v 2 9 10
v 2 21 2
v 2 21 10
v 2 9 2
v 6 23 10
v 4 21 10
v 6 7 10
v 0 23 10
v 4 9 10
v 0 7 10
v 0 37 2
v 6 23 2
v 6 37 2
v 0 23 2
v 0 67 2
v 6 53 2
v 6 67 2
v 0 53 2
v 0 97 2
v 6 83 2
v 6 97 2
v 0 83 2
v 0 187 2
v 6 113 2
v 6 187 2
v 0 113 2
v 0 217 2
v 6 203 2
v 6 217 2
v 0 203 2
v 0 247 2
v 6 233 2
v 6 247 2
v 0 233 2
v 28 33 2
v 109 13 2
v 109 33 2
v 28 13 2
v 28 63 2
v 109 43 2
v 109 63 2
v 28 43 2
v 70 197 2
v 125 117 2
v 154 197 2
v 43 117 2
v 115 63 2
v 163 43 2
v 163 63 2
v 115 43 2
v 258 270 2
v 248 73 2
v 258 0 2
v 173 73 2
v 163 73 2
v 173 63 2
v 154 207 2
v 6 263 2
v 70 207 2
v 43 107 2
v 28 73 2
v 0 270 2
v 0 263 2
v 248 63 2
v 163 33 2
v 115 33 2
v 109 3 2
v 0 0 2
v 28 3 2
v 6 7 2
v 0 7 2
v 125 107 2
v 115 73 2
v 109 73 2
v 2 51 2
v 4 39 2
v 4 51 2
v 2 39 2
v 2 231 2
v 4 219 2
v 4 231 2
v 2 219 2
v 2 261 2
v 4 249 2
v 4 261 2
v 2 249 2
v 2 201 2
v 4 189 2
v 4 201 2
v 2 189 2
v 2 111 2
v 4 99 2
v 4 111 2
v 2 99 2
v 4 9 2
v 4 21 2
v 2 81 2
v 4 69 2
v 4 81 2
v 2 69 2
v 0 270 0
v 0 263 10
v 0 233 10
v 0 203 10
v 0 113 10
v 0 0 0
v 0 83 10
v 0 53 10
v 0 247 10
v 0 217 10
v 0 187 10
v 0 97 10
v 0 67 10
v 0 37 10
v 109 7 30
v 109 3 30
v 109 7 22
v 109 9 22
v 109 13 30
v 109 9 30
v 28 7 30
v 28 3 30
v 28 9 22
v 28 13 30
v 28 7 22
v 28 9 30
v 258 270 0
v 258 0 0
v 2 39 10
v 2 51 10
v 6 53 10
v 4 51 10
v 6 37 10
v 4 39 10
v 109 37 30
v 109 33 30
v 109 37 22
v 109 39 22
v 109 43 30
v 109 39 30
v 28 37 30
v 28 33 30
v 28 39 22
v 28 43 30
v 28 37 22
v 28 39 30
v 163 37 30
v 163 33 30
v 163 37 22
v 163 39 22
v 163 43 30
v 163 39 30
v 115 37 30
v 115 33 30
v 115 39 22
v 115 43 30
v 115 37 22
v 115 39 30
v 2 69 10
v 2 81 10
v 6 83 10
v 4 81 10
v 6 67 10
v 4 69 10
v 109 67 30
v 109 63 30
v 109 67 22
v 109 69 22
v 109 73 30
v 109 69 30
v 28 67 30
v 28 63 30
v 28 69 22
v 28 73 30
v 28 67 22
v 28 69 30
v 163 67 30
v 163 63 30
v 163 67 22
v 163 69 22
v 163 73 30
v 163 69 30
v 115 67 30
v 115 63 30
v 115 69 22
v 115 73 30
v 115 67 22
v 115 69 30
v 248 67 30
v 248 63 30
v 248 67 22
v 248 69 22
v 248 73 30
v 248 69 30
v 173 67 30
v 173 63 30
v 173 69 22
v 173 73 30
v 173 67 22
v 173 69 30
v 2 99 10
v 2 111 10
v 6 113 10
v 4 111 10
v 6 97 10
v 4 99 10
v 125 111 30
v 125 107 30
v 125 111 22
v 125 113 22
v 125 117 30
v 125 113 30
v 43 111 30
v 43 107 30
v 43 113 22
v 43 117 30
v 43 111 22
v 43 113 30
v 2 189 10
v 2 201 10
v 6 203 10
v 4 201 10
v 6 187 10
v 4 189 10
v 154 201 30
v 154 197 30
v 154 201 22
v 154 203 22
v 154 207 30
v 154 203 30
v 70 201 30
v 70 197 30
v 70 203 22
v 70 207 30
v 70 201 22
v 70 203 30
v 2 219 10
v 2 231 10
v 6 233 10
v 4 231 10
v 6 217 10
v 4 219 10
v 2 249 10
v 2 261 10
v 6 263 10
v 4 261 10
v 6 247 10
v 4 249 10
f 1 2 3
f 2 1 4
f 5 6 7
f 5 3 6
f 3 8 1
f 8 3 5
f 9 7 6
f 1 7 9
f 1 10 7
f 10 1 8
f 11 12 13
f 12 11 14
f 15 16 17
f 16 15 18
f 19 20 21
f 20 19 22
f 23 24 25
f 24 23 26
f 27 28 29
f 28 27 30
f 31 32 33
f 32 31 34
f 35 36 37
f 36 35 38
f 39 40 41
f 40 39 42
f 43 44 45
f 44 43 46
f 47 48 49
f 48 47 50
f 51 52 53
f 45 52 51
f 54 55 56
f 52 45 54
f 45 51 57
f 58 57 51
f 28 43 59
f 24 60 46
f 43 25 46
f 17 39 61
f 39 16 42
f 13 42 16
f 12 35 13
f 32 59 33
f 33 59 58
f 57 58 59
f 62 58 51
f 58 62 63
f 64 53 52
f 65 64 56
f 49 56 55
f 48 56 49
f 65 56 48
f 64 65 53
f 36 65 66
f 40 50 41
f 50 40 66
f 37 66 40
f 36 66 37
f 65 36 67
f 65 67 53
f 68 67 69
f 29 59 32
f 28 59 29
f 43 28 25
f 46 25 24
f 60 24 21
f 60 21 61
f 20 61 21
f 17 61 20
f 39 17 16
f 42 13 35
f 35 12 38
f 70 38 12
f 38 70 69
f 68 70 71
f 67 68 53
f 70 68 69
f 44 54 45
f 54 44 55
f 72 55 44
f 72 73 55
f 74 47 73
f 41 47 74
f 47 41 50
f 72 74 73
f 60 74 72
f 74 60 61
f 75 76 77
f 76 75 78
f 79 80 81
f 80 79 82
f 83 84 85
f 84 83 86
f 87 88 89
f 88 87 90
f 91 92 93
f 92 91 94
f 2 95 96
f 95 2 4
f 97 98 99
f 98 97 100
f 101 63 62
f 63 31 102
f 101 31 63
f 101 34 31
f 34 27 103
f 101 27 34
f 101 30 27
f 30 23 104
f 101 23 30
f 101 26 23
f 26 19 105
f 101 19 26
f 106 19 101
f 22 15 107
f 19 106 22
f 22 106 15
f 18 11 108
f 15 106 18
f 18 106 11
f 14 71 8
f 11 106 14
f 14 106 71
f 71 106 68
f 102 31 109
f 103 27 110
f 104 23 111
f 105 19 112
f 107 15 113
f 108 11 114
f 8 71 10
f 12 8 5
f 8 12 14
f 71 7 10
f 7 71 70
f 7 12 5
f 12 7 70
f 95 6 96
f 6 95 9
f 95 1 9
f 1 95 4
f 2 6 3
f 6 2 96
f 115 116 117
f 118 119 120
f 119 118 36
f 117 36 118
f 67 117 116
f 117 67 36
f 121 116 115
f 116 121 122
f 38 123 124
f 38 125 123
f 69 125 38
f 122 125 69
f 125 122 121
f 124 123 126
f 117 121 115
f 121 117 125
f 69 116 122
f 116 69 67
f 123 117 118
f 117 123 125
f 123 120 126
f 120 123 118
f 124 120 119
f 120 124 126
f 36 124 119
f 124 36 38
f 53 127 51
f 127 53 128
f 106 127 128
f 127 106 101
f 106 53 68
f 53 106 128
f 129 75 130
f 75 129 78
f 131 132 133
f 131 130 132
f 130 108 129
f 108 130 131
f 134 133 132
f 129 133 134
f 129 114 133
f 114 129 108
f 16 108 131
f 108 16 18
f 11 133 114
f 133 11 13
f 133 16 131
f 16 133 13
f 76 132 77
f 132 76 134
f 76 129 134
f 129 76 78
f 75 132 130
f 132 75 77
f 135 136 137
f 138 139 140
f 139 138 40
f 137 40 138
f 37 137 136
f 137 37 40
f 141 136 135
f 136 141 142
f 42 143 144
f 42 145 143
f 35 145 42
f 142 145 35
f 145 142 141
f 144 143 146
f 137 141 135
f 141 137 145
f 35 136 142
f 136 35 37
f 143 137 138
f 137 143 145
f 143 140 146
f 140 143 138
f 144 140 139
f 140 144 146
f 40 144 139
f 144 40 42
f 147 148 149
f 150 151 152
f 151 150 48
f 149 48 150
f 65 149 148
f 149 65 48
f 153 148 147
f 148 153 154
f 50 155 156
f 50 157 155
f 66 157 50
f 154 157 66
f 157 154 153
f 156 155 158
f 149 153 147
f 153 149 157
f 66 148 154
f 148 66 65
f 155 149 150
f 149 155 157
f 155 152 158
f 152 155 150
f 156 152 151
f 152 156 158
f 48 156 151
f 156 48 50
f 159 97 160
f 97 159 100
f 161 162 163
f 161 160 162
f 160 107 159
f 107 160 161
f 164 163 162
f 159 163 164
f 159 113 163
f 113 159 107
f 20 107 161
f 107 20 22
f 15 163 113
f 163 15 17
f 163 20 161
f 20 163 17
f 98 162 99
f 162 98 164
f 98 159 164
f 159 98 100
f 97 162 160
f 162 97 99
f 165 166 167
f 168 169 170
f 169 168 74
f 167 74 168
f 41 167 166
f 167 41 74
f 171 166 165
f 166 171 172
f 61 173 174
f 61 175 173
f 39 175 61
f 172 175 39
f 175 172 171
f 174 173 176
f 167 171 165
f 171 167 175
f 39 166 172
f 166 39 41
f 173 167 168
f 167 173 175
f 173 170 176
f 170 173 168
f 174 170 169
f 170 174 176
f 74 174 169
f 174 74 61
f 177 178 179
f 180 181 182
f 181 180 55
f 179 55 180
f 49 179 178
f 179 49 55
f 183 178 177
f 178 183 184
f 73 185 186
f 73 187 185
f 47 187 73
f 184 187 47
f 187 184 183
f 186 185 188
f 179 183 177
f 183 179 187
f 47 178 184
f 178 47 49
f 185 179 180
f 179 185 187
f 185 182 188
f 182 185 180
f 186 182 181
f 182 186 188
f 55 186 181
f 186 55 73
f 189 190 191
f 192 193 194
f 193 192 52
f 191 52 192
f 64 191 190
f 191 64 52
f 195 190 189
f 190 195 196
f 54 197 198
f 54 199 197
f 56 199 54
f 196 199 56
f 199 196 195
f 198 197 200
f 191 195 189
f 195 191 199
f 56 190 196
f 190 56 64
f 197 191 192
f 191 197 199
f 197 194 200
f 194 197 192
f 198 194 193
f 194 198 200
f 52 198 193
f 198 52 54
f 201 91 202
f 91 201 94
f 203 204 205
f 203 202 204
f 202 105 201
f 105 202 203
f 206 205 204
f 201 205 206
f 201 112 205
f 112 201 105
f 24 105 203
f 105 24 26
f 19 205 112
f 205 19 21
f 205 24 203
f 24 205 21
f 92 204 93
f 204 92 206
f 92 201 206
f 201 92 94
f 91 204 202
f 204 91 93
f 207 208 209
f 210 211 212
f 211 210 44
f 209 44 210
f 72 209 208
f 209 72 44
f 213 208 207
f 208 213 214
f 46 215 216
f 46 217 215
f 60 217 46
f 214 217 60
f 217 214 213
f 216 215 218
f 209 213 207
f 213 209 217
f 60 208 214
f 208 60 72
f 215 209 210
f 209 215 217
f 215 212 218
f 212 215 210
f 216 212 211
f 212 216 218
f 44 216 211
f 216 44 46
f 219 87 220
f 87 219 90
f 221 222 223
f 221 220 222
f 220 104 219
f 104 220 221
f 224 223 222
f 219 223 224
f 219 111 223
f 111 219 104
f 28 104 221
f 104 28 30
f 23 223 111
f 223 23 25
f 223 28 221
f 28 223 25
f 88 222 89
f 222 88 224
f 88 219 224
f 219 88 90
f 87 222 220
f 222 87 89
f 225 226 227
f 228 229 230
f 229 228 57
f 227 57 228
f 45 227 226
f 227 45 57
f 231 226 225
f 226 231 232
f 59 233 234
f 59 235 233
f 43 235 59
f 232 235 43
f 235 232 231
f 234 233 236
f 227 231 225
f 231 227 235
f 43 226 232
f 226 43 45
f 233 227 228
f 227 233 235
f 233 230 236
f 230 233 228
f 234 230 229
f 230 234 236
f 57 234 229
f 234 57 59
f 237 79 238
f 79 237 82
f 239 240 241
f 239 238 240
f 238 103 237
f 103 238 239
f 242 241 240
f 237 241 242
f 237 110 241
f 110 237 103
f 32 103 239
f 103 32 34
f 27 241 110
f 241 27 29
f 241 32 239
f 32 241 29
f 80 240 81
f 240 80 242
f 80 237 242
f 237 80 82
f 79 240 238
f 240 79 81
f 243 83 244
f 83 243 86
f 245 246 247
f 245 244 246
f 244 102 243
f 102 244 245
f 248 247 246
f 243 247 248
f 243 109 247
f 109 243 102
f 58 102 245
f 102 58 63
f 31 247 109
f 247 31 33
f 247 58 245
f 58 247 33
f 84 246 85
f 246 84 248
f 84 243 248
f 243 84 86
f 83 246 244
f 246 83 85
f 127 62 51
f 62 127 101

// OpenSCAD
// file: cardshowcase.scad
module base_tarjeta(desplazamiento, posicion_tarjeta, longitud_tarjeta, altura_borde_tarjeta, altura_interior_tarjeta)
{
    color("purple") translate([ posicion_tarjeta, desplazamiento + 1, 2 ])
        cube([ longitud_tarjeta, 4, altura_borde_tarjeta ]);

    color("pink") translate([ posicion_tarjeta, desplazamiento + 5, 2 ])
        cube([ longitud_tarjeta, 2, altura_interior_tarjeta ]);

    color("purple") translate([ posicion_tarjeta, desplazamiento + 7, 2 ])
        cube([ longitud_tarjeta, 4, altura_borde_tarjeta ]);
}

module soporte_tarjeta(tipo)
{
    if (tipo == "ISA8")
    {
        desplazamiento = 2;
        posicion_tarjeta = 28;
        longitud_tarjeta = 81;
        altura_borde_tarjeta = 28;
        altura_interior_tarjeta = 20;

        base_tarjeta(desplazamiento, posicion_tarjeta, longitud_tarjeta, altura_borde_tarjeta, altura_interior_tarjeta);
    }
    else if (tipo == "ISA16")
    {
        soporte_tarjeta("ISA8");

        desplazamiento = 2;
        posicion_tarjeta = 28 + 81 + 6;
        longitud_tarjeta = 48;
        altura_borde_tarjeta = 28;
        altura_interior_tarjeta = 20;

        base_tarjeta(desplazamiento, posicion_tarjeta, longitud_tarjeta, altura_borde_tarjeta, altura_interior_tarjeta);
    }
    else if (tipo == "VLB")
    {
        soporte_tarjeta("ISA16");

        desplazamiento = 2;
        posicion_tarjeta = 28 + 135 + 10;
        longitud_tarjeta = 75;
        altura_borde_tarjeta = 28;
        altura_interior_tarjeta = 20;

        base_tarjeta(desplazamiento, posicion_tarjeta, longitud_tarjeta, altura_borde_tarjeta, altura_interior_tarjeta);
    }
    else if (tipo == "PCI")
    {
        desplazamiento = 16;
        posicion_tarjeta = 43;
        longitud_tarjeta = 82;
        altura_borde_tarjeta = 28;
        altura_interior_tarjeta = 20;

        base_tarjeta(desplazamiento, posicion_tarjeta, longitud_tarjeta, altura_borde_tarjeta, altura_interior_tarjeta);
    }
    else if (tipo == "AGP")
    {
        desplazamiento = 16;
        posicion_tarjeta = 70;
        longitud_tarjeta = 84;
        altura_borde_tarjeta = 28;
        altura_interior_tarjeta = 20;

        base_tarjeta(desplazamiento, posicion_tarjeta, longitud_tarjeta, altura_borde_tarjeta, altura_interior_tarjeta);
    }
}

module single_slot(tipo, position)
{

    displacement = position * 30;

    if (ancho_placa_base == "ISA8")
    {

        color("cyan") cube([ 119, 30 + displacement, 2 ]);
    }
    else if (ancho_placa_base == "ISA16")
    {

        color("cyan") cube([ 173, 30 + displacement, 2 ]);
    }
    else if (ancho_placa_base == "VLB")
    {

        color("cyan") cube([ 258, 30 + displacement, 2 ]);
    }
    else if (ancho_placa_base == "PCI")
    {

        color("cyan") cube([ 135, 30 + displacement, 2 ]);
    }
    else if (ancho_placa_base == "AGP")
    {

        color("cyan") cube([ 164, 30 + displacement, 2 ]);
    }

    if (tipo != "empty")
    {
        color("red") translate([ 0, 7 + displacement, 2 ]) cube([ 2, 16, 8 ]);

        color("red") translate([ 4, 7 + displacement, 2 ]) cube([ 2, 16, 8 ]);

        color("red") translate([ 2, 7 + displacement, 2 ]) cube([ 2, 2, 8 ]);

        color("red") translate([ 2, 21 + displacement, 2 ]) cube([ 2, 2, 8 ]);
    }

    if (tipo == "ISA8" || tipo == "ISA16" || tipo == "PCI" || tipo == "AGP" || tipo == "VLB")
    {
        translate([ 0, displacement, 0 ]) soporte_tarjeta(tipo);
    }
}
// main file
include <cardshowcase.scad>

ancho_placa_base = "VLB";

single_slot("ISA8", 0);
single_slot("ISA16", 1);
single_slot("VLB", 2);
single_slot("PCI", 3);
single_slot("empty", 4);
single_slot("empty", 5);
single_slot("AGP", 6);
single_slot("notch", 7);
single_slot("notch", 8);
